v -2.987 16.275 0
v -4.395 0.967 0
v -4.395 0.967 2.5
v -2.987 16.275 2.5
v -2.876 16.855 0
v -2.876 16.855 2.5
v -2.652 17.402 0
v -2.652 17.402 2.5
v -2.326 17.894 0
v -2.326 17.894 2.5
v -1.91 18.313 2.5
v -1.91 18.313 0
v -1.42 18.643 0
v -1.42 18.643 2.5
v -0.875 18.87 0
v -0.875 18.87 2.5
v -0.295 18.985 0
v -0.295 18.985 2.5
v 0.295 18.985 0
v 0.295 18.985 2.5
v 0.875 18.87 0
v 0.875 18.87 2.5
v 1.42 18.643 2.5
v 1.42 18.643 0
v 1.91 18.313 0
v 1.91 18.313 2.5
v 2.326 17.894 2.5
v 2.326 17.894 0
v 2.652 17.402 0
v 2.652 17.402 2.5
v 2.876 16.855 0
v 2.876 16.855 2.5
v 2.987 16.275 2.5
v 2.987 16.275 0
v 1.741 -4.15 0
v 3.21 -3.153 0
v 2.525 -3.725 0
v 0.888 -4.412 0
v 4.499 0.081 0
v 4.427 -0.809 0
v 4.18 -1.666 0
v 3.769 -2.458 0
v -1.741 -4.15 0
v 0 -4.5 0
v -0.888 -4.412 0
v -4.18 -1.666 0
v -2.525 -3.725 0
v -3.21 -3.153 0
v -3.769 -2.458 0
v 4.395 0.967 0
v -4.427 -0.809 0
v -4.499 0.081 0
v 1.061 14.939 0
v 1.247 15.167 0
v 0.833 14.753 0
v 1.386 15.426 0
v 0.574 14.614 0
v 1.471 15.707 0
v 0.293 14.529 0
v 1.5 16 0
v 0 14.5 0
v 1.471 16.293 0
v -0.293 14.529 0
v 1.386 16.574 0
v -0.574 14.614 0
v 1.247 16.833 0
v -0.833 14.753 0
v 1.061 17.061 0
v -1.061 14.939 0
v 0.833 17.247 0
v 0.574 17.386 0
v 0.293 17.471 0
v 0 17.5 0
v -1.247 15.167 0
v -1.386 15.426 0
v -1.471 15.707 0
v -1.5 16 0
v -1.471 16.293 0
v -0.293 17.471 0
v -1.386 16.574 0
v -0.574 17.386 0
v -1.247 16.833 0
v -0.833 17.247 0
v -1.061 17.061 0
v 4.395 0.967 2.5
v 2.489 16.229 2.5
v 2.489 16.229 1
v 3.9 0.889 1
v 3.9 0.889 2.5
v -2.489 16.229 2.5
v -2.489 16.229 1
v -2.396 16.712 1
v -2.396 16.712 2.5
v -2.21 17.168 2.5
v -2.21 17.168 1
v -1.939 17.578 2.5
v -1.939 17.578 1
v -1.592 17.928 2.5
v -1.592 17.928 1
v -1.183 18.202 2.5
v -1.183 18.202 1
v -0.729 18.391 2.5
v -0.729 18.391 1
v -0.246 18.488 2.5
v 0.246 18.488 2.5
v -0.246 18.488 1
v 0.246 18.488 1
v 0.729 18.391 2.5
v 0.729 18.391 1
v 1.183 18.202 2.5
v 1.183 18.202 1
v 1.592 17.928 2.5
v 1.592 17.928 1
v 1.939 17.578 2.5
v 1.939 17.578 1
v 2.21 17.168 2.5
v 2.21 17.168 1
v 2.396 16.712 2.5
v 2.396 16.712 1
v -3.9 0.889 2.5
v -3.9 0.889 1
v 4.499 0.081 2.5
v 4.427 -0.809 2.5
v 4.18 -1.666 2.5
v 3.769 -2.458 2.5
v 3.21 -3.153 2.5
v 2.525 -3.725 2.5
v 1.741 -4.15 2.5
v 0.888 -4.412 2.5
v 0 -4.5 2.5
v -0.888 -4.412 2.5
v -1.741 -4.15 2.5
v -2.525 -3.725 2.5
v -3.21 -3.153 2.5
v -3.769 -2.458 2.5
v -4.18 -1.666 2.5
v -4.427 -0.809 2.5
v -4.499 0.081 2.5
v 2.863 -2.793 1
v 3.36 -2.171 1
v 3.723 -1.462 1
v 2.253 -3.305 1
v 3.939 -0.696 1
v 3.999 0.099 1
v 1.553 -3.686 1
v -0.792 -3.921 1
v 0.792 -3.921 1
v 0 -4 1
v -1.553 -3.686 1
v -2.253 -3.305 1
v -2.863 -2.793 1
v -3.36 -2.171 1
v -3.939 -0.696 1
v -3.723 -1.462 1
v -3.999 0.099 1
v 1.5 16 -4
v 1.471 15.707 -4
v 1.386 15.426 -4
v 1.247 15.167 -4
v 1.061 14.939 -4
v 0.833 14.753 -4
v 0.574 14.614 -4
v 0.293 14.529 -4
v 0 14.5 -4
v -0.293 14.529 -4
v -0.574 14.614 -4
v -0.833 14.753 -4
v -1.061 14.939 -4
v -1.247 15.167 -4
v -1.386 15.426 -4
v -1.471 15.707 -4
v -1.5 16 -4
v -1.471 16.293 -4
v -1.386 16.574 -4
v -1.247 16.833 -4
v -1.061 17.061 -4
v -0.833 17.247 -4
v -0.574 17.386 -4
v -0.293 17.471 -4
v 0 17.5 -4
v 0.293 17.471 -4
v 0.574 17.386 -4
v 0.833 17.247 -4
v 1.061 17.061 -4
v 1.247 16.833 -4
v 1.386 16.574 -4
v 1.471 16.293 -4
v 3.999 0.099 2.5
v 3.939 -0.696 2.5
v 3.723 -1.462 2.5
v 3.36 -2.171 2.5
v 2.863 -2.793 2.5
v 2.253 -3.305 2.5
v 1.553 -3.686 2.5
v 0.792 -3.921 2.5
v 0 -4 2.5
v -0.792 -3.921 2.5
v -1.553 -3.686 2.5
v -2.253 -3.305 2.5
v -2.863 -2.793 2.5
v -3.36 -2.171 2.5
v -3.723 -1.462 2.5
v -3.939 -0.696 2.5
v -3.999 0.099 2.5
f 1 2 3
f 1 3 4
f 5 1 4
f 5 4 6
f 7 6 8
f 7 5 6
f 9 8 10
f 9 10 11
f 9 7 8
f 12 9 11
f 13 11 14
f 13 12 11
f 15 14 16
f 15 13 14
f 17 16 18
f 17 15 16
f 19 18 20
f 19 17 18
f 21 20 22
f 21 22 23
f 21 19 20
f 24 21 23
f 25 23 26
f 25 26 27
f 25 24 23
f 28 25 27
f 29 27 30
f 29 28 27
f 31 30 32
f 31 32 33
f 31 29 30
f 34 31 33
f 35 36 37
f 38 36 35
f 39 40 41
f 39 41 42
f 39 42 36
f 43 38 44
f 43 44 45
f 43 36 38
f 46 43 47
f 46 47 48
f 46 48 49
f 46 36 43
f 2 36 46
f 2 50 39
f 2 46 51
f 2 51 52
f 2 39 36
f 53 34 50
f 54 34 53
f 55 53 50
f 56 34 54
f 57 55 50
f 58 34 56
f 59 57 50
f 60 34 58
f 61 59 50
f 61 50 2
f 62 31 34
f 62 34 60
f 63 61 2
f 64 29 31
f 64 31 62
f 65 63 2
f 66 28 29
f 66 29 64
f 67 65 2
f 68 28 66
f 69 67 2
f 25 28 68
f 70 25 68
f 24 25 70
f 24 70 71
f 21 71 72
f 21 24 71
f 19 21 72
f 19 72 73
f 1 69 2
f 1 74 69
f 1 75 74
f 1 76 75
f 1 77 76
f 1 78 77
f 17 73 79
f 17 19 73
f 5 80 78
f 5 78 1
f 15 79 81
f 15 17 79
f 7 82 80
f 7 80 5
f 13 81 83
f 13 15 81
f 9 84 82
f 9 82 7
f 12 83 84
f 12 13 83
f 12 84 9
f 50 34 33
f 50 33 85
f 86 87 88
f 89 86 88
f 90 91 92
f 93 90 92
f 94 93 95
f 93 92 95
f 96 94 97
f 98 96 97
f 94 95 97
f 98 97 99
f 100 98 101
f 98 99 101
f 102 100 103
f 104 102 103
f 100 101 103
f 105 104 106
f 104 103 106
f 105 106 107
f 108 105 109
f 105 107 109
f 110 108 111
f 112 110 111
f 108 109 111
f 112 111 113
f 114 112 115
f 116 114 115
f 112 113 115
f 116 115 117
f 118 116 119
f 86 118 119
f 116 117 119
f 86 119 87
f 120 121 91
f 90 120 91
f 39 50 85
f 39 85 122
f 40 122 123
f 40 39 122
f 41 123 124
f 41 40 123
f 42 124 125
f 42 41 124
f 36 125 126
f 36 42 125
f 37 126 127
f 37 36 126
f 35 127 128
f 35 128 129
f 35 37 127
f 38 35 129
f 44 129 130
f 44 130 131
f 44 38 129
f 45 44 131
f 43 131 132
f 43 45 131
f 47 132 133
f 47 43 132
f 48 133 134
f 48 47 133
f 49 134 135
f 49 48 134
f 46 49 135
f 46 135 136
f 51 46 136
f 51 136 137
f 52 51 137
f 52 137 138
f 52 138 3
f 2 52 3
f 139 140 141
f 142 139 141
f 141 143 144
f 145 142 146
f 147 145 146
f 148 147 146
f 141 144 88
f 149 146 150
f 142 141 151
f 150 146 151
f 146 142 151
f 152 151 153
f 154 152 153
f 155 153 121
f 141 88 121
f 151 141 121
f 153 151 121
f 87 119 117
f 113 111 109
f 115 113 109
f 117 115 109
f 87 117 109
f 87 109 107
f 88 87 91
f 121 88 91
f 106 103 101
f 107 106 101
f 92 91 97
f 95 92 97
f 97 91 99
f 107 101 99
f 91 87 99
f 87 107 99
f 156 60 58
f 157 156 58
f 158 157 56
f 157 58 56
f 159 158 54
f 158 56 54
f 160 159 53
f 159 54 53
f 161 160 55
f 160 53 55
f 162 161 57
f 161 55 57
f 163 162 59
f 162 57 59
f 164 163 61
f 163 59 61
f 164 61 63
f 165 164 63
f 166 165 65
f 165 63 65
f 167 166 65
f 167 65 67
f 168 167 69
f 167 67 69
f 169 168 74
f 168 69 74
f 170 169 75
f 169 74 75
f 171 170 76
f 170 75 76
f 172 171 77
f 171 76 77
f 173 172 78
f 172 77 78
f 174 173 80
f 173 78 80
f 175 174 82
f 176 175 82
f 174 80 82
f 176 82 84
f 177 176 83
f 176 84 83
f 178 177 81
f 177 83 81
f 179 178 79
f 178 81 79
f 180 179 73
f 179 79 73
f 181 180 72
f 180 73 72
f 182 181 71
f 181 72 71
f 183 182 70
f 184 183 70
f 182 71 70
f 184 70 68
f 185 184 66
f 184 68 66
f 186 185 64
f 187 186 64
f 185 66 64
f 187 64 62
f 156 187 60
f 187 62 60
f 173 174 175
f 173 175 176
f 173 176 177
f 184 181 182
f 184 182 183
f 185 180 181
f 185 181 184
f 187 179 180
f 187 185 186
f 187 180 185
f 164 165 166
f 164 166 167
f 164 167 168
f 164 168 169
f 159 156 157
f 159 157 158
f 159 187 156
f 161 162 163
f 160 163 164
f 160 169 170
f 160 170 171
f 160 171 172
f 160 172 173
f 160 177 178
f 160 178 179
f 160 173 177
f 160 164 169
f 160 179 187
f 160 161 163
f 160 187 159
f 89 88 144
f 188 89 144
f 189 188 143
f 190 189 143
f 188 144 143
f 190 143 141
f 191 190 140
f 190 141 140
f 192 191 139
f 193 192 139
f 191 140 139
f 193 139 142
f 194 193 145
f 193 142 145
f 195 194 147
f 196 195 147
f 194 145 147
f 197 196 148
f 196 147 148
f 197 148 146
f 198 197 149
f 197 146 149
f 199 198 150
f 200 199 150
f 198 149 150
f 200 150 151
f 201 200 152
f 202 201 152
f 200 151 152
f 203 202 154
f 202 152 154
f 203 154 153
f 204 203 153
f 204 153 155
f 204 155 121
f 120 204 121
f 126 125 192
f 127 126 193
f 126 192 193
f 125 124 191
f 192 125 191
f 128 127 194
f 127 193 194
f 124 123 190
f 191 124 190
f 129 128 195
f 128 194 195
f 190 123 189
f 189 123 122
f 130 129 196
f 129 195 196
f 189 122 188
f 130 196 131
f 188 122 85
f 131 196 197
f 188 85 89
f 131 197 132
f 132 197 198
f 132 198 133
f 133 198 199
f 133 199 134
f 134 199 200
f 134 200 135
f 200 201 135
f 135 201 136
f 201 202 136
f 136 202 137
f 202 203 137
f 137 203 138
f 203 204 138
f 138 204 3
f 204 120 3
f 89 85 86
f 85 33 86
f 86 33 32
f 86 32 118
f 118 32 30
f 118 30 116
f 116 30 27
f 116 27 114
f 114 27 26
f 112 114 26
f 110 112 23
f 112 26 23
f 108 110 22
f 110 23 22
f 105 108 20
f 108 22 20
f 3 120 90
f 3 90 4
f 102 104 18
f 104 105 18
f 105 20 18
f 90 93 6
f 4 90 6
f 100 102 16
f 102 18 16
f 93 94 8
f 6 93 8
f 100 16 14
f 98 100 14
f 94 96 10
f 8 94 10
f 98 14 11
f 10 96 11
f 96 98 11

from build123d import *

# Parameters (mm, degrees)
BOSS_EXTRUDE1_DEPTH = 1
EXTRUDE_THIN1_DEPTH = 2.5
SKETCH2_R           = 1.5
BOSS_EXTRUDE2_DEPTH = 4


with BuildPart() as part:
    # Sketch1 → Boss-Extrude1 (new body)
    with BuildSketch(Plane.XY):
        with BuildLine():
            Line((-3.9, 0.888819442), (-2.48949833, 16.228906238))
            ThreePointArc((-2.48949833, 16.228906238), (0, 18.5), (2.48949833, 16.228906238))
            Line((2.48949833, 16.228906238), (3.9, 0.888819442))
            ThreePointArc((3.9, 0.888819442), (0, -4), (-3.9, 0.888819442))
        make_face()
    extrude(amount=BOSS_EXTRUDE1_DEPTH)

    # Sketch1<3> → Extrude-Thin1 (add)
    with BuildSketch(Plane.XY):
        with BuildLine():
            Line((-4.394954578, 0.966630363), (-2.987397996, 16.274687485))
            ThreePointArc((-2.987397996, 16.274687485), (0, 19), (2.987397996, 16.274687485))
            Line((2.987397996, 16.274687485), (4.394954578, 0.966630363))
            ThreePointArc((4.394954578, 0.966630363), (0, -4.5), (-4.394954578, 0.966630363))
        make_face()
        with BuildLine():
            Line((-3.9, 0.888819442), (-2.48949833, 16.228906238))
            ThreePointArc((-2.48949833, 16.228906238), (0, 18.5), (2.48949833, 16.228906238))
            Line((2.48949833, 16.228906238), (3.9, 0.888819442))
            ThreePointArc((3.9, 0.888819442), (0, -4), (-3.9, 0.888819442))
        make_face(mode=Mode.SUBTRACT)
    extrude(amount=EXTRUDE_THIN1_DEPTH)

    # Sketch2 → Boss-Extrude2 (add)
    with BuildSketch(Plane(origin=(0, 0, 0), x_dir=(-1, 0, 0), z_dir=(0, 0, -1))):
        with Locations((0, 16)):
            Circle(SKETCH2_R)
    extrude(amount=BOSS_EXTRUDE2_DEPTH)


solid = part.part
